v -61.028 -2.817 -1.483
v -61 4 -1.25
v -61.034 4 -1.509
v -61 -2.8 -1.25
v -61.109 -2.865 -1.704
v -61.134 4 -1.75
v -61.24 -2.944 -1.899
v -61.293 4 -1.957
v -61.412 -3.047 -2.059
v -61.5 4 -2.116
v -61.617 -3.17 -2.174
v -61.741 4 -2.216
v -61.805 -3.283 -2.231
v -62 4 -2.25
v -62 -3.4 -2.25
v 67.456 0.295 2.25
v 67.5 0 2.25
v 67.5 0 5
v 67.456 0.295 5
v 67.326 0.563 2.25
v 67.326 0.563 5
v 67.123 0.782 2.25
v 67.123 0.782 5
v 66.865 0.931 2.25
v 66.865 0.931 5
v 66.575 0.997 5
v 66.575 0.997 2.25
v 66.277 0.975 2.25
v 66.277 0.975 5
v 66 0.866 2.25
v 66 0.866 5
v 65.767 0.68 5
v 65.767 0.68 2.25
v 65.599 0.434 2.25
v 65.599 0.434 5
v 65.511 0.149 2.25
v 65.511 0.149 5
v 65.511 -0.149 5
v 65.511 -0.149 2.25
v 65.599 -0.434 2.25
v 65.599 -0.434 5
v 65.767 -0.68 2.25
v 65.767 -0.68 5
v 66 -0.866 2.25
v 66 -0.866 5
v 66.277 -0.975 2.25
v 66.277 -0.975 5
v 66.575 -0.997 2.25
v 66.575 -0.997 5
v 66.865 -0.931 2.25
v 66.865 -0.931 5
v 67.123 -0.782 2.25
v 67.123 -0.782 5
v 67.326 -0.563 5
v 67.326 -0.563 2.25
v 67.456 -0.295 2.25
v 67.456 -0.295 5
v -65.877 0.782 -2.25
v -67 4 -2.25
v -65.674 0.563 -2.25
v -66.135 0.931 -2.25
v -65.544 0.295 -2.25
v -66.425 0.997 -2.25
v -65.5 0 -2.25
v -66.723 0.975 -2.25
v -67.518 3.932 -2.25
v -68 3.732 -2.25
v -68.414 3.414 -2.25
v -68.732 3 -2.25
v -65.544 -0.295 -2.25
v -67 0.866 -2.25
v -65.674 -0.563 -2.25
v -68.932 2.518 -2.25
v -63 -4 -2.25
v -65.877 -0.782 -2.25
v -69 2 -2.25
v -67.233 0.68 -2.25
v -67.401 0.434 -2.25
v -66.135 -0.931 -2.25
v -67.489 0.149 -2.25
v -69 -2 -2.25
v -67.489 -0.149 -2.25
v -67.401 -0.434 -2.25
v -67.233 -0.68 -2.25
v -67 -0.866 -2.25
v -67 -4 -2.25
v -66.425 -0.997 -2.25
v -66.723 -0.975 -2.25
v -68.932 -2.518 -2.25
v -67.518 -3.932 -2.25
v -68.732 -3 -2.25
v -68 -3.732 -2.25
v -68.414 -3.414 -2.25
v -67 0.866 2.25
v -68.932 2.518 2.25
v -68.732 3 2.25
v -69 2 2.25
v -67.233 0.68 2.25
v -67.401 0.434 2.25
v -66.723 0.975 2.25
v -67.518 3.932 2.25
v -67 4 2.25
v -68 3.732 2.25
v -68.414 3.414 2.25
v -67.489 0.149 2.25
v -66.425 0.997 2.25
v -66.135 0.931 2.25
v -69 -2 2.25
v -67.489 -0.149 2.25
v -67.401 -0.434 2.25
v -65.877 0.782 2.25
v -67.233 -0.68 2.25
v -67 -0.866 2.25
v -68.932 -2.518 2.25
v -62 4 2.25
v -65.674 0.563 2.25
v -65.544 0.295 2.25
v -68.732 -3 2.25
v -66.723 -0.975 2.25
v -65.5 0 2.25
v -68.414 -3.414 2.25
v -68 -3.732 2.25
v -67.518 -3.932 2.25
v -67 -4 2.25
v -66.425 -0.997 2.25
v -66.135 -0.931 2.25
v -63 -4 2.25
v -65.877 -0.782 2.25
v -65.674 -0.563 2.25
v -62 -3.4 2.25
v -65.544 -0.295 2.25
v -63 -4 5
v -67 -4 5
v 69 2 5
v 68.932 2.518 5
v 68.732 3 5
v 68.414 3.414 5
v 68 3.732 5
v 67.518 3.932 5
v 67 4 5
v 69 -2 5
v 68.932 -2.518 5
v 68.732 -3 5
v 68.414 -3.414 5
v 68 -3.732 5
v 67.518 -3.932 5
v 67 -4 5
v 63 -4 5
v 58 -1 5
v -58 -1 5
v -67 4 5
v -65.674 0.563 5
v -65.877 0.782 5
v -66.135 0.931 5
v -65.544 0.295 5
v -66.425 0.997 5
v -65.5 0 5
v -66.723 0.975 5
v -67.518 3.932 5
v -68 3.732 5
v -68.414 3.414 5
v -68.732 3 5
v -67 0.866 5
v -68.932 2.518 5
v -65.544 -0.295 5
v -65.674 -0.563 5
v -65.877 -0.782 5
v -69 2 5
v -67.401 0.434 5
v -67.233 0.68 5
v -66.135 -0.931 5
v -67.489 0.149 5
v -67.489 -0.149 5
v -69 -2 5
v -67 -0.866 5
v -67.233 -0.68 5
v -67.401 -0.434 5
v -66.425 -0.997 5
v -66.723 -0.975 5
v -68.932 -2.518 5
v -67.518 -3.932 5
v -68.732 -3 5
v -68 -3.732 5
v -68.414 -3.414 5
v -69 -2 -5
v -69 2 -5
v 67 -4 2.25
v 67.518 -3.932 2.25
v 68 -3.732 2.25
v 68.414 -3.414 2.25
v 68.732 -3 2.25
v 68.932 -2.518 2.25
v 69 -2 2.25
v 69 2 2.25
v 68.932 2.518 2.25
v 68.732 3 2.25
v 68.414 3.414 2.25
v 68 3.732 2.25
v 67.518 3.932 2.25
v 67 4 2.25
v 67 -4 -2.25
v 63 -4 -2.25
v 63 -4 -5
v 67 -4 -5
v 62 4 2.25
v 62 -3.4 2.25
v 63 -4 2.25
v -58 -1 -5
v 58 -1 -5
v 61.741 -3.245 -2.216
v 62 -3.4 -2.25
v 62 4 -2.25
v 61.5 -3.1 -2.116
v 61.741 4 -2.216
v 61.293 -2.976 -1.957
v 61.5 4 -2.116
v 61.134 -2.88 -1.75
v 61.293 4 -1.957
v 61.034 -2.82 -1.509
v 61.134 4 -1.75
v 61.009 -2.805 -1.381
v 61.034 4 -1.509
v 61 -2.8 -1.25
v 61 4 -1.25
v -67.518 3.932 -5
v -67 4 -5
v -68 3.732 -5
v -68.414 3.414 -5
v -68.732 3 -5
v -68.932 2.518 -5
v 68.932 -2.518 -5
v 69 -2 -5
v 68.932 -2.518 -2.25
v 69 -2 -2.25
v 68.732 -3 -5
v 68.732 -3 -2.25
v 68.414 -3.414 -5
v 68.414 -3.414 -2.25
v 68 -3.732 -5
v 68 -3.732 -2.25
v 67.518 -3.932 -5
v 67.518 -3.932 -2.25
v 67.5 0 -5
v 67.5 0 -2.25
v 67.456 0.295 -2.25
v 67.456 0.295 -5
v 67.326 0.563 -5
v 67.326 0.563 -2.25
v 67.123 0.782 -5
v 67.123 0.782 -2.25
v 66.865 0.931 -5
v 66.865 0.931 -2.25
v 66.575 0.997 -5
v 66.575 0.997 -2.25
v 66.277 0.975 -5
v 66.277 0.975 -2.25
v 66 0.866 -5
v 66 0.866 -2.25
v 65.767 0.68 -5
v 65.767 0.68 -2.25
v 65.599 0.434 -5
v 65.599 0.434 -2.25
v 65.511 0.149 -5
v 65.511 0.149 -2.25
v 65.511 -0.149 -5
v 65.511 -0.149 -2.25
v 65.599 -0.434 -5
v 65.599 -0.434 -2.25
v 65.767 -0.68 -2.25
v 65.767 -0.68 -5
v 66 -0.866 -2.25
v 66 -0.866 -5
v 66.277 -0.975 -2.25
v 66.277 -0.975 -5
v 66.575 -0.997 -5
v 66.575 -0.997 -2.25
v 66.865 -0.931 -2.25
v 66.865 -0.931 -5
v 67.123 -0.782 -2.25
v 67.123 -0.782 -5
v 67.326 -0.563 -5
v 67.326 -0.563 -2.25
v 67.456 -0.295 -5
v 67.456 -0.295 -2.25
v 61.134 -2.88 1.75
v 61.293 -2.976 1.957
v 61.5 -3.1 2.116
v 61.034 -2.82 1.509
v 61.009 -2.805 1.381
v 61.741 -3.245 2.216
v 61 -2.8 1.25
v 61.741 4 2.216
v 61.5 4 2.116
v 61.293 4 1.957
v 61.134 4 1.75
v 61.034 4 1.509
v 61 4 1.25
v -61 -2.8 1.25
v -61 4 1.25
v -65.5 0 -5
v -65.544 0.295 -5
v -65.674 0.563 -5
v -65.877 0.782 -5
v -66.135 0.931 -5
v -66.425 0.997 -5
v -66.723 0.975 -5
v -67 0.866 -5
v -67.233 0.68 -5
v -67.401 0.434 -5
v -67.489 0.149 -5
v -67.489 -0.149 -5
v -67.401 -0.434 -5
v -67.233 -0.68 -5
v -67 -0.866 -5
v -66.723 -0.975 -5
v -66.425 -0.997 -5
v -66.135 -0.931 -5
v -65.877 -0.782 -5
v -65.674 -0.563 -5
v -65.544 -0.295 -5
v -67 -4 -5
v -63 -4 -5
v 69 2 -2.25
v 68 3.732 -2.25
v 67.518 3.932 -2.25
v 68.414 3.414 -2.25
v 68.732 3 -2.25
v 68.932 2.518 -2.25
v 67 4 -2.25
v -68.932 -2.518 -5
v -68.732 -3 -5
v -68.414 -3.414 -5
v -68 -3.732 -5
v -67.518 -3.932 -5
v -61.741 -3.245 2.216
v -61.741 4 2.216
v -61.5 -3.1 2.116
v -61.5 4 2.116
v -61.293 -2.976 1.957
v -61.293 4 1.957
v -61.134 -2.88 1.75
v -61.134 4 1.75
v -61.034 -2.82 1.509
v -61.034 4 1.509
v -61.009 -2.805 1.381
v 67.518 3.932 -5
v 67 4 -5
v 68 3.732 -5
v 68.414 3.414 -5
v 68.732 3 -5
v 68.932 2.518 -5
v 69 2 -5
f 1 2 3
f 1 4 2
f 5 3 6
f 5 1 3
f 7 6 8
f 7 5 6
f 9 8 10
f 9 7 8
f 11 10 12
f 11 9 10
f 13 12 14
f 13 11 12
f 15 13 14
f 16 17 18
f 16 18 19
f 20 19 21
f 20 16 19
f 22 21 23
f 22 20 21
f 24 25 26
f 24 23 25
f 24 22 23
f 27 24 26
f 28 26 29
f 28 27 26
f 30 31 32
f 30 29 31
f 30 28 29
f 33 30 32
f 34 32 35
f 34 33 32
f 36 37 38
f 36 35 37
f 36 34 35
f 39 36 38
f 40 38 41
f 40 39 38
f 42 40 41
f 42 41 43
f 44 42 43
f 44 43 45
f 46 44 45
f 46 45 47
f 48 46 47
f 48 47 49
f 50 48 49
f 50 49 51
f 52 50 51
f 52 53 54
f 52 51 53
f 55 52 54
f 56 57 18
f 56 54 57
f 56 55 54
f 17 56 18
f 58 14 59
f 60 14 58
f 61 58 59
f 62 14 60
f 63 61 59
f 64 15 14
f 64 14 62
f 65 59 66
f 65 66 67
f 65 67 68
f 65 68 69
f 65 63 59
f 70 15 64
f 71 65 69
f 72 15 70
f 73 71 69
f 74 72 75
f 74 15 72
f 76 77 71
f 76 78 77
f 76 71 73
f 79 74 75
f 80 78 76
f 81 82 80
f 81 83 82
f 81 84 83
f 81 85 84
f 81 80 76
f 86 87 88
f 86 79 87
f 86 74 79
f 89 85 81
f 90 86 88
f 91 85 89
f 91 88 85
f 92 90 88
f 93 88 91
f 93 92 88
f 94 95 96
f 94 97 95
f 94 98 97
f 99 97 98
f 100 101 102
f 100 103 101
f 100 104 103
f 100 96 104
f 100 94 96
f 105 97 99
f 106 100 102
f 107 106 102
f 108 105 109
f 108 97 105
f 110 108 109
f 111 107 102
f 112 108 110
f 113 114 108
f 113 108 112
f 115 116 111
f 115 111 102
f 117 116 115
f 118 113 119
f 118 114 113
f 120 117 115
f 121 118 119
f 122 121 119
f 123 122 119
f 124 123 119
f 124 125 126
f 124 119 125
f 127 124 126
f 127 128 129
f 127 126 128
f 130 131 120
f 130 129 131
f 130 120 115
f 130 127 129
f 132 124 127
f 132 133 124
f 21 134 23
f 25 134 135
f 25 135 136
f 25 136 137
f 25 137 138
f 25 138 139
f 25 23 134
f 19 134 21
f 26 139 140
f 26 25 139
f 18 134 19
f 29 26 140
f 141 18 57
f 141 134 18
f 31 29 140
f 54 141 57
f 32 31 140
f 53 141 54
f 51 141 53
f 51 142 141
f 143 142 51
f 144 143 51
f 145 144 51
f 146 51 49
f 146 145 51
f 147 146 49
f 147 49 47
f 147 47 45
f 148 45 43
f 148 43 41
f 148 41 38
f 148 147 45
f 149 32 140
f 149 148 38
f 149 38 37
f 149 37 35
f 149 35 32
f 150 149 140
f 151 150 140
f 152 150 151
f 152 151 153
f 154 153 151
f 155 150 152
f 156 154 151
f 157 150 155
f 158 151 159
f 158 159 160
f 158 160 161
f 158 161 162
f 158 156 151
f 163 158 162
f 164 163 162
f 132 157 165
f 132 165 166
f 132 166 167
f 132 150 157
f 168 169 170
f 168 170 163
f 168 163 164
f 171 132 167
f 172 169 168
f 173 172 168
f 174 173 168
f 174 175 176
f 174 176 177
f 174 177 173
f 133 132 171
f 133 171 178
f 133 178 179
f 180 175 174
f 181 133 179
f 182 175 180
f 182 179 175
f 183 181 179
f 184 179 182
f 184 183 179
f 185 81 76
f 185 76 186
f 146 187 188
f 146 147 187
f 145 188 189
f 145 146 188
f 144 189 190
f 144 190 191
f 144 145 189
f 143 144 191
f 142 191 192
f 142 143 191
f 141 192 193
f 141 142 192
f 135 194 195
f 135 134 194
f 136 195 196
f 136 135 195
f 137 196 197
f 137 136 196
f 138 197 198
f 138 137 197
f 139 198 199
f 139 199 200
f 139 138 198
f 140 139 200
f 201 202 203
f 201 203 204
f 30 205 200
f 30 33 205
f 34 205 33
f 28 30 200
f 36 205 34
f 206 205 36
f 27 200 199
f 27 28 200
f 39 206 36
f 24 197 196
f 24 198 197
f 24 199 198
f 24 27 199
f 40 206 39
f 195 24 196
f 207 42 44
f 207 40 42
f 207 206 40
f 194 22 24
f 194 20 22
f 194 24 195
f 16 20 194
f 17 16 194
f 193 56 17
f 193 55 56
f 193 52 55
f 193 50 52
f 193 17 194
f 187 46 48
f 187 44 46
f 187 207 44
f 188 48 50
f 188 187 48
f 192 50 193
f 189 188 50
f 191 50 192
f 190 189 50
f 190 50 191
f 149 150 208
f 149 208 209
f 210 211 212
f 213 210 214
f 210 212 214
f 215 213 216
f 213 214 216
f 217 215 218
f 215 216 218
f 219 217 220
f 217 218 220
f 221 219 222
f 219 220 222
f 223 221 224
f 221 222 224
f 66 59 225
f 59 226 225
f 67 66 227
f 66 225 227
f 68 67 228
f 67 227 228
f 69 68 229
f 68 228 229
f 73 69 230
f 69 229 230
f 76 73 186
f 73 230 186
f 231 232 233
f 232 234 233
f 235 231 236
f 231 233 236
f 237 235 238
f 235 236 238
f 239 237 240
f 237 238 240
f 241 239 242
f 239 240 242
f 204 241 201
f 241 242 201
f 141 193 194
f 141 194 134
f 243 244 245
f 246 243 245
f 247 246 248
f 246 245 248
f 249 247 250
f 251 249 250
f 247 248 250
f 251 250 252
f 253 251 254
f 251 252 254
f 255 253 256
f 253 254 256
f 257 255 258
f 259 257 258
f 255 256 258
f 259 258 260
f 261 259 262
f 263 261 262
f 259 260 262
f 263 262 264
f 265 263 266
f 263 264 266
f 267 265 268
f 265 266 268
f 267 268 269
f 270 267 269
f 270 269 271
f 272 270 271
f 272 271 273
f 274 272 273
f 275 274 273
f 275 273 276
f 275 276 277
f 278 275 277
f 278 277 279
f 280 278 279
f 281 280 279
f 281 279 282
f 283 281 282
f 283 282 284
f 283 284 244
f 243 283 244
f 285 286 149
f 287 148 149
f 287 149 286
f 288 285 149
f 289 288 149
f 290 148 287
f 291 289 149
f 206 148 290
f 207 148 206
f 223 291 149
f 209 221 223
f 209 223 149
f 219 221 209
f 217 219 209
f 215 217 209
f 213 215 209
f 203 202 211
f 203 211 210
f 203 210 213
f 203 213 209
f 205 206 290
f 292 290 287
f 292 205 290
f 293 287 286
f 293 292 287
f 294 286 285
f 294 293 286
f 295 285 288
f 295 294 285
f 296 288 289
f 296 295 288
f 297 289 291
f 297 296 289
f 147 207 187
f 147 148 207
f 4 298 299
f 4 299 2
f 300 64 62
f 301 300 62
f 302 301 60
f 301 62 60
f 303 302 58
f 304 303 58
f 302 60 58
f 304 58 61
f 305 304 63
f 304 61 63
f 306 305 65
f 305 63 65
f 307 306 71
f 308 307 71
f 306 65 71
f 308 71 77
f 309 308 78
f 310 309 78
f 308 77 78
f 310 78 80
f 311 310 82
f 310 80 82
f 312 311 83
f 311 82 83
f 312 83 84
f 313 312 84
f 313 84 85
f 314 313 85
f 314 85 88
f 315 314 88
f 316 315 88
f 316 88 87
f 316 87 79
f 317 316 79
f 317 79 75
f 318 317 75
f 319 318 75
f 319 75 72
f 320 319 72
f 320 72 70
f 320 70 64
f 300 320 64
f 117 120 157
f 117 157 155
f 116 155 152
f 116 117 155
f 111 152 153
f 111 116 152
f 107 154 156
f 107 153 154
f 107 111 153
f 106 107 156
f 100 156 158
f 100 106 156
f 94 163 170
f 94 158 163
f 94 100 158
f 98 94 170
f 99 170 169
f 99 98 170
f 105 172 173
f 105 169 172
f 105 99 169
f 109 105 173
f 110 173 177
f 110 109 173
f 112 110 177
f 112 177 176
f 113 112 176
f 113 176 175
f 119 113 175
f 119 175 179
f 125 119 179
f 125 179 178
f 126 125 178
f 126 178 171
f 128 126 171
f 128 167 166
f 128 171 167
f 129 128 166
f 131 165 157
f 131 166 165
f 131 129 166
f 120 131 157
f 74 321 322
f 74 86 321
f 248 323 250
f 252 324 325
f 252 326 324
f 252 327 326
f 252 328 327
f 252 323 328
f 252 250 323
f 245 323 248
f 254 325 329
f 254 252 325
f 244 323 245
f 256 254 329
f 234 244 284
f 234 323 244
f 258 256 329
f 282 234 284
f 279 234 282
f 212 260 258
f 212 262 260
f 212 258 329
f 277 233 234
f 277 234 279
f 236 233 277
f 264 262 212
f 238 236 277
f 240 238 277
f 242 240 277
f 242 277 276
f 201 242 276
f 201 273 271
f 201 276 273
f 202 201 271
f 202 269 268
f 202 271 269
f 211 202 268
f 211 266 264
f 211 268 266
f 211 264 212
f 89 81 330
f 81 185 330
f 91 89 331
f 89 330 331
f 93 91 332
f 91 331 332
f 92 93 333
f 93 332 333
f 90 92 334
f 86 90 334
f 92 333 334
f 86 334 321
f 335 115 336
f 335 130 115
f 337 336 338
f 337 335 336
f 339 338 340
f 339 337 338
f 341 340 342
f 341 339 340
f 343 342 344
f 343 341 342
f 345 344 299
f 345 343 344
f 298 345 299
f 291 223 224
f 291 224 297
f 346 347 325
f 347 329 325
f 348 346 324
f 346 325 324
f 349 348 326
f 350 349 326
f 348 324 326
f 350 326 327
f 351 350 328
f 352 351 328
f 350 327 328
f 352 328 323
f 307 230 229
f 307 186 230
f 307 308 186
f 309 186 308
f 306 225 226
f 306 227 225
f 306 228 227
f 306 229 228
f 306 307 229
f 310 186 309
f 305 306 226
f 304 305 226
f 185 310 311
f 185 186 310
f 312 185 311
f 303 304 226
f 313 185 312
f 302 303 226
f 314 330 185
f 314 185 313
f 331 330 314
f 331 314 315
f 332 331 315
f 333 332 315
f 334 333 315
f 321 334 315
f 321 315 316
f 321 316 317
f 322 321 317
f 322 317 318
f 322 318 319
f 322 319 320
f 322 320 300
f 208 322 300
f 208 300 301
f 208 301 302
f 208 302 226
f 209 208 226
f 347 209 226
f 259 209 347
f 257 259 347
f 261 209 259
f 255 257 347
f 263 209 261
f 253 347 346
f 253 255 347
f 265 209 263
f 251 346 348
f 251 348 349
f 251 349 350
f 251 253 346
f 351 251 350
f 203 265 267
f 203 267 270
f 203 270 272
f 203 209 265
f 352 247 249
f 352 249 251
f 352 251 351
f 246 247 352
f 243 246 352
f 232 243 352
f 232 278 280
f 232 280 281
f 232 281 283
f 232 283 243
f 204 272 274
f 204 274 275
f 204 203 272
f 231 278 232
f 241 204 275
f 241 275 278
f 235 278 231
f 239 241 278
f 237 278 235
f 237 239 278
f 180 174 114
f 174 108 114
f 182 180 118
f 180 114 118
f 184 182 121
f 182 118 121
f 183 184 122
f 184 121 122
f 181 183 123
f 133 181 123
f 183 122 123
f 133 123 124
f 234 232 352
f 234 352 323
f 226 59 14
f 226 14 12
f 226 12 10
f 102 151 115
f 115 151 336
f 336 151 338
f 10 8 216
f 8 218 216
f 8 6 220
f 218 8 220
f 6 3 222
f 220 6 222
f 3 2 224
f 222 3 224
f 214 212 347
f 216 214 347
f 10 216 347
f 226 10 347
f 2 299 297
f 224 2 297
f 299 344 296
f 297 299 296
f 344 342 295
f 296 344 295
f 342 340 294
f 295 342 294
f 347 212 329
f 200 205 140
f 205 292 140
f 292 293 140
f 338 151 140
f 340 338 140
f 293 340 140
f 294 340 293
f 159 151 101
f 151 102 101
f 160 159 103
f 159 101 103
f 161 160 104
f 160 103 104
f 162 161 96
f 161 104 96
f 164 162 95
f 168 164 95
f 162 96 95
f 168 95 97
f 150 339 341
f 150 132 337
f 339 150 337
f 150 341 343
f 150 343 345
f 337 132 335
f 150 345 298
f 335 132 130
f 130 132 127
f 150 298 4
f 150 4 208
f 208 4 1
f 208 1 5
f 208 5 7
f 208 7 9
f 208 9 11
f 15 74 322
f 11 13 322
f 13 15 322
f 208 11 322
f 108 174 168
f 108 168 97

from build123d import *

# Parameters (mm, degrees)
F1_DEPTH      = 4
F2_R          = 1
F3_DEPTH      = 5.001
F3_DEPTH_BACK = 5.001
F4_W          = 126
F4_H          = 10
F5_DEPTH      = 10
F6_SIZE2      = 2.99999
F6_SIZE       = 4.99999
F7_R          = 2
F8_R          = 1


# Not quite as in the source:
# - a fillet or chamfer is up to 0.001 mm smaller than in the source, because OpenCascade refuses the exact size


with BuildPart() as f1:
    # F0 (on Front) → F1 (new body, symmetric)
    with BuildSketch(Plane.XZ):
        Polygon((69, 2.25), (69, 5), (-69, 5), (-69, 2.25), (-61, 2.25), (-61, -2.25), (-69, -2.25), (-69, -5), (69, -5), (69, -2.25), (61, -2.25), (61, 2.25), align=None)
    extrude(amount=F1_DEPTH, both=True)

    # F2 (on Top) → F3 (cut, two sides)
    with BuildSketch(Plane.XY) as f3_sk:
        with Locations((-66.5, 0)):
            Circle(F2_R)
        with Locations((66.5, 0)):
            Circle(F2_R)
    extrude(amount=-F3_DEPTH, mode=Mode.SUBTRACT)
    extrude(f3_sk.sketch, amount=F3_DEPTH_BACK, mode=Mode.SUBTRACT)

    # F4 (on Top) → F5 (cut, symmetric)
    with BuildSketch(Plane.XY):
        with Locations((0, -6)):
            Rectangle(F4_W, F4_H)
    extrude(amount=F5_DEPTH, both=True, mode=Mode.SUBTRACT)

    # F6 (size 5 and 3 in the source; OpenCascade refuses exactly that, so slightly less here)
    f6_edges = [f1.edges().sort_by_distance(p)[0] for p in [
        (-63, -1, 3.625),
        (63, -1, 3.625),
    ]]
    f6_side = f1.faces().sort_by_distance((0, -1, 0))[0]
    chamfer(f6_edges, length=F6_SIZE, length2=F6_SIZE2, reference=f6_side)

    # F7
    f7_edges = [f1.edges().sort_by_distance(p)[0] for p in [
        (-69, 4, 3.625),
        (-69, 4, -3.625),
        (-69, -4, 3.625),
        (-69, -4, -3.625),
        (69, -4, 3.625),
        (69, -4, -3.625),
        (69, 4, -3.625),
        (69, 4, 3.625),
    ]]
    fillet(f7_edges, radius=F7_R)

    # F8
    f8_edges = [f1.edges().sort_by_distance(p)[0] for p in [
        (61, 0.600004, -2.25),
        (61, 0.600004, 2.25),
        (-61, 0.600004, 2.25),
        (-61, 0.600004, -2.25),
    ]]
    fillet(f8_edges, radius=F8_R)


solid = f1.part
